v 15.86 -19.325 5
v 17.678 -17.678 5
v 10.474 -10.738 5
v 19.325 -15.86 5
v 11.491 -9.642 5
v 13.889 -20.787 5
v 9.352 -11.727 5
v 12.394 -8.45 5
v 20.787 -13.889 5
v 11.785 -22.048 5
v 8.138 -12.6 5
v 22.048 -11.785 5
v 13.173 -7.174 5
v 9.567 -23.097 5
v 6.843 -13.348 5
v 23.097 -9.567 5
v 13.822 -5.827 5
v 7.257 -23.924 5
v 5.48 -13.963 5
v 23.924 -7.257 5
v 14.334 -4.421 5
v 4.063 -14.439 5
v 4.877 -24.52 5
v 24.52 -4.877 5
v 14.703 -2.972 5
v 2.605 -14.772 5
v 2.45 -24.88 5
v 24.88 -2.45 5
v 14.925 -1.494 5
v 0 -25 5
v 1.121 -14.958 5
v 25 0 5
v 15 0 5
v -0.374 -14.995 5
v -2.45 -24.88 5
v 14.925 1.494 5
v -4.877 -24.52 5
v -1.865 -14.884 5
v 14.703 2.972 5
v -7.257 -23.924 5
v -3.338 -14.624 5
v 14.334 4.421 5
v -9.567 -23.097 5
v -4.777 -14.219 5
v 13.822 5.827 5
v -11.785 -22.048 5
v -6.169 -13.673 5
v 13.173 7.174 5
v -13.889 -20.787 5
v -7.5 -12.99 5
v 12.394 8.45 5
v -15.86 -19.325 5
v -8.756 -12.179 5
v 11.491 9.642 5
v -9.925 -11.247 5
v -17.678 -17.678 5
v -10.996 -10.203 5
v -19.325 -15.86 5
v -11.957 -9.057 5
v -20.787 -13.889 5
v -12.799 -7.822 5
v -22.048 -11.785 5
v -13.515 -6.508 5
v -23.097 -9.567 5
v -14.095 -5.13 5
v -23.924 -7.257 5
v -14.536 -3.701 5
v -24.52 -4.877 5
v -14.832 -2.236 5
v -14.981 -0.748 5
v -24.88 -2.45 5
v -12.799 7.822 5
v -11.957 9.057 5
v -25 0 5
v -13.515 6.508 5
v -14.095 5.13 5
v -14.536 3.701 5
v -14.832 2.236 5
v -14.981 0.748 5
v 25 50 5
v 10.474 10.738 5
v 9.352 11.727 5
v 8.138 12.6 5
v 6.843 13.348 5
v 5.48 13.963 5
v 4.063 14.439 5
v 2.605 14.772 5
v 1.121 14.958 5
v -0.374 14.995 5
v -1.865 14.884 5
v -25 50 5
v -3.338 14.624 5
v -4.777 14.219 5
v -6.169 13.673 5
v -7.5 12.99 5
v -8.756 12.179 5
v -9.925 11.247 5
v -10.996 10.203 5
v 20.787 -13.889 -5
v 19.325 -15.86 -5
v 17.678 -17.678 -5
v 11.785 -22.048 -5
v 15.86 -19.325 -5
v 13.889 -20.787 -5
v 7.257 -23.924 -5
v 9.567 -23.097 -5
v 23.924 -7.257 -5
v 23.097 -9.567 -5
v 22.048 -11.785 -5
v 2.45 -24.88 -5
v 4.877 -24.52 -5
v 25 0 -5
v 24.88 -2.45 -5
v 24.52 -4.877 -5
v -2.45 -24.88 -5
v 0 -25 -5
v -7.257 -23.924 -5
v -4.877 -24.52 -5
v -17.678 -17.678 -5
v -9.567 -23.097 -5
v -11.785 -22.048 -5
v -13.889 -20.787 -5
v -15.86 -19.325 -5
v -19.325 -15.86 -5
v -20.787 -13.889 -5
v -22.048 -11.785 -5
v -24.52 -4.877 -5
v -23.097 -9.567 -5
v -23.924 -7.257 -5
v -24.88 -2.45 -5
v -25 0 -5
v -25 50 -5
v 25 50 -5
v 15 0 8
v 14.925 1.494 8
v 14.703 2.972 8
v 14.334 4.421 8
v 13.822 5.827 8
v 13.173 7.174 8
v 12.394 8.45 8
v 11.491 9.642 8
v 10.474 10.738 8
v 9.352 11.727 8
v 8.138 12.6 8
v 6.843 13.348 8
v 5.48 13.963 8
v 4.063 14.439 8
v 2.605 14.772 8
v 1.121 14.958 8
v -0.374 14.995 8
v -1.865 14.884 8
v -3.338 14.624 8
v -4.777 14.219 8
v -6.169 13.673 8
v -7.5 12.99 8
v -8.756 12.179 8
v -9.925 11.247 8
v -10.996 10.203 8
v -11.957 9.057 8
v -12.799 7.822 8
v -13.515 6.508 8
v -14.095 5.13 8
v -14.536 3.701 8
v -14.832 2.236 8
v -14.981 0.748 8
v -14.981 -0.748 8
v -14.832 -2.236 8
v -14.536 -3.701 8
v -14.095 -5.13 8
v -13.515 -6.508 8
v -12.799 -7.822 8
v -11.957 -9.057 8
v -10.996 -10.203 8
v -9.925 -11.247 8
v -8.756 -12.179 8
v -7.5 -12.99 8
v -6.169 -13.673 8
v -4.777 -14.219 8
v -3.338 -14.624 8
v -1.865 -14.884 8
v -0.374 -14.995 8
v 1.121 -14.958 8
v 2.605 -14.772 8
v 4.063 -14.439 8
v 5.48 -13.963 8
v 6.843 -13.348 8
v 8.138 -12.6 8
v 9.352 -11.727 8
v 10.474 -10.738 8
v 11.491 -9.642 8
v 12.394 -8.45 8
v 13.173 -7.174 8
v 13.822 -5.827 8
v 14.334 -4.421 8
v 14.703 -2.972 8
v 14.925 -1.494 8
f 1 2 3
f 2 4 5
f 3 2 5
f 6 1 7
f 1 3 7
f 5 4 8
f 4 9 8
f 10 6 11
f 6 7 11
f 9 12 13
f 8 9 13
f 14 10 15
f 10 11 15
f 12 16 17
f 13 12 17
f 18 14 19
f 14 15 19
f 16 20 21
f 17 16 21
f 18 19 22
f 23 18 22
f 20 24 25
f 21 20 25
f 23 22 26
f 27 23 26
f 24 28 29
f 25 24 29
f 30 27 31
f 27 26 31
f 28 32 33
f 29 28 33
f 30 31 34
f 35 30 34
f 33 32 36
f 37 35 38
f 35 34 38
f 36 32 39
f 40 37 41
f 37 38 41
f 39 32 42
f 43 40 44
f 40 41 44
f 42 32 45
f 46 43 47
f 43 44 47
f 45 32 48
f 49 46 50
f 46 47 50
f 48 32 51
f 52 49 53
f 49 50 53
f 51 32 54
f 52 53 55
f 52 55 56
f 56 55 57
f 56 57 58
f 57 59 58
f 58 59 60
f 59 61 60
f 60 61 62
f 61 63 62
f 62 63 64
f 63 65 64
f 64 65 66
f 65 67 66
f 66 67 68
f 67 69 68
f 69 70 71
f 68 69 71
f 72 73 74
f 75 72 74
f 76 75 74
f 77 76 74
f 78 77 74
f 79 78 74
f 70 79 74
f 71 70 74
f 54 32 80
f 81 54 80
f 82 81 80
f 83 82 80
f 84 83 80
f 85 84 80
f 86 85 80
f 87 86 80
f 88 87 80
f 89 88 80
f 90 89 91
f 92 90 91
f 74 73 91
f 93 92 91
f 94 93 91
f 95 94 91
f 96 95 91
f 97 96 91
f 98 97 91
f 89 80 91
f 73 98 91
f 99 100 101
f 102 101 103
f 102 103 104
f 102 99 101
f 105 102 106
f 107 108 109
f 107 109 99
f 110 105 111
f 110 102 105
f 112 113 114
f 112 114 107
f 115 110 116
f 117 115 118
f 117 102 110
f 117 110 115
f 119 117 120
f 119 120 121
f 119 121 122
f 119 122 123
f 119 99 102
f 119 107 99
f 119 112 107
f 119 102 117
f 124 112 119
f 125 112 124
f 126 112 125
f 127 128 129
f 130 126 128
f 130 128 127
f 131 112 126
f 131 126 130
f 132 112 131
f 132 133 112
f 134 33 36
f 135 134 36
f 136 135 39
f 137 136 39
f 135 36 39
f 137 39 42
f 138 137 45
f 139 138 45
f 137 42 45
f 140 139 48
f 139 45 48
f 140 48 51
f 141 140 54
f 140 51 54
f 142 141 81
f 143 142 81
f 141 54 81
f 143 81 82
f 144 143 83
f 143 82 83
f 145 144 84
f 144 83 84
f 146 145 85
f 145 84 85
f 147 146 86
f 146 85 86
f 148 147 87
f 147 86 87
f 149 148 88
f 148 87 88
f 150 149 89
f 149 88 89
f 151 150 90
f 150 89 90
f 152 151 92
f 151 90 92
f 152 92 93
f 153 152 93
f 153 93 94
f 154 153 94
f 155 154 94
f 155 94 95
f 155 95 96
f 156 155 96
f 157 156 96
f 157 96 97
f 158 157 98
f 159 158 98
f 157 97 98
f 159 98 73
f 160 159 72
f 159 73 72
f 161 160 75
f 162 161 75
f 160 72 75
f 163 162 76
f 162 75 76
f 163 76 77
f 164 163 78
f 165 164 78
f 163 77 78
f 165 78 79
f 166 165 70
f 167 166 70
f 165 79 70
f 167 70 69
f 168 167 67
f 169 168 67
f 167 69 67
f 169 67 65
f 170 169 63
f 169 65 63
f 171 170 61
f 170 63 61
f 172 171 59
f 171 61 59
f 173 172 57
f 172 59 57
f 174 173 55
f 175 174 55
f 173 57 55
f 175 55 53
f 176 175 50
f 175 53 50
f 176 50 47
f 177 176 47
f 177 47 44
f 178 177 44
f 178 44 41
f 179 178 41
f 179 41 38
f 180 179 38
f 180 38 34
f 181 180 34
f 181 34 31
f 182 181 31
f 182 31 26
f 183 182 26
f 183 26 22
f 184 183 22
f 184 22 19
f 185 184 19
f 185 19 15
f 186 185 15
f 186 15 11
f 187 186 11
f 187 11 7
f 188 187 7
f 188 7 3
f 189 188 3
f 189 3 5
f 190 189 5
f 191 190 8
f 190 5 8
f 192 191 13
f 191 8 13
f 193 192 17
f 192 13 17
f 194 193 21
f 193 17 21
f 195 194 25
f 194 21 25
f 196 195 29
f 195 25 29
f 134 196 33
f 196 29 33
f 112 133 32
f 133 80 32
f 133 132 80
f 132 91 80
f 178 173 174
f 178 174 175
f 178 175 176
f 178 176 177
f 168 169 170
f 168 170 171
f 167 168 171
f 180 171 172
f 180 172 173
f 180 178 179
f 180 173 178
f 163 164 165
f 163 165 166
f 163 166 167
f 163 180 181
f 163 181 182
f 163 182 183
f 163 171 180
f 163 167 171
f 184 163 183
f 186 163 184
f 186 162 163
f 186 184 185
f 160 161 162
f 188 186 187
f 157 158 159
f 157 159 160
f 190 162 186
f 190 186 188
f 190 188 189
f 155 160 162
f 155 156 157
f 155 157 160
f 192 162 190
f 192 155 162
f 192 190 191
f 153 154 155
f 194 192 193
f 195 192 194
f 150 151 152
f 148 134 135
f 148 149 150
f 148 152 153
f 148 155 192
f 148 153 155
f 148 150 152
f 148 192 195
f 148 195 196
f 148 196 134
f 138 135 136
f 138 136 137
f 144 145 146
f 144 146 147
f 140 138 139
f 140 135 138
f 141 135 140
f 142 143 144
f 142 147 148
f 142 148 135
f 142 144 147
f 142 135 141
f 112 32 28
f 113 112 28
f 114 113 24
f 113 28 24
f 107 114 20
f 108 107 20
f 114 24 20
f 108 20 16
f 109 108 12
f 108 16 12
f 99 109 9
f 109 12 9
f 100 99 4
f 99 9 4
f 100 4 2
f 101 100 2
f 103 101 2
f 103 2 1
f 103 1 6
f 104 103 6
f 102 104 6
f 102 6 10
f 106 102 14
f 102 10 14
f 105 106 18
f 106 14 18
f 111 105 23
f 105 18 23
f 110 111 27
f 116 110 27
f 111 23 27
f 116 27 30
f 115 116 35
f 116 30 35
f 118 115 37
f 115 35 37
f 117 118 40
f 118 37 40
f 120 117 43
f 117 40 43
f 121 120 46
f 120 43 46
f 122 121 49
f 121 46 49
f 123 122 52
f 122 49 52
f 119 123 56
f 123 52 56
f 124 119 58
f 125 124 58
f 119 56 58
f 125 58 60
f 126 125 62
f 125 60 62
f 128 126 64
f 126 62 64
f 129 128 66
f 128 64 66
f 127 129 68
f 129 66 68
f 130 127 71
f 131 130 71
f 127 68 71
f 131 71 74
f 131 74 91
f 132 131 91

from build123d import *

# Parameters (mm, degrees)
BOSS_EXTRUDE1_DEPTH = 5
SKETCH3_R           = 15
BOSS_EXTRUDE2_DEPTH = 3


with BuildPart() as part:
    # Sketch1 → Boss-Extrude1 (new, symmetric)
    with BuildSketch(Plane.XY):
        with BuildLine():
            Line((-25, 0), (-25, 50))
            Line((-25, 50), (25, 50))
            Line((25, 50), (25, 0))
            ThreePointArc((25, 0), (0, -25), (-25, 0))
        make_face()
    extrude(amount=BOSS_EXTRUDE1_DEPTH, both=True)

    # Sketch3 → Boss-Extrude2 (add)
    with BuildSketch(Plane.XY.offset(5)):
        Circle(SKETCH3_R)
    extrude(amount=BOSS_EXTRUDE2_DEPTH)


solid = part.part
